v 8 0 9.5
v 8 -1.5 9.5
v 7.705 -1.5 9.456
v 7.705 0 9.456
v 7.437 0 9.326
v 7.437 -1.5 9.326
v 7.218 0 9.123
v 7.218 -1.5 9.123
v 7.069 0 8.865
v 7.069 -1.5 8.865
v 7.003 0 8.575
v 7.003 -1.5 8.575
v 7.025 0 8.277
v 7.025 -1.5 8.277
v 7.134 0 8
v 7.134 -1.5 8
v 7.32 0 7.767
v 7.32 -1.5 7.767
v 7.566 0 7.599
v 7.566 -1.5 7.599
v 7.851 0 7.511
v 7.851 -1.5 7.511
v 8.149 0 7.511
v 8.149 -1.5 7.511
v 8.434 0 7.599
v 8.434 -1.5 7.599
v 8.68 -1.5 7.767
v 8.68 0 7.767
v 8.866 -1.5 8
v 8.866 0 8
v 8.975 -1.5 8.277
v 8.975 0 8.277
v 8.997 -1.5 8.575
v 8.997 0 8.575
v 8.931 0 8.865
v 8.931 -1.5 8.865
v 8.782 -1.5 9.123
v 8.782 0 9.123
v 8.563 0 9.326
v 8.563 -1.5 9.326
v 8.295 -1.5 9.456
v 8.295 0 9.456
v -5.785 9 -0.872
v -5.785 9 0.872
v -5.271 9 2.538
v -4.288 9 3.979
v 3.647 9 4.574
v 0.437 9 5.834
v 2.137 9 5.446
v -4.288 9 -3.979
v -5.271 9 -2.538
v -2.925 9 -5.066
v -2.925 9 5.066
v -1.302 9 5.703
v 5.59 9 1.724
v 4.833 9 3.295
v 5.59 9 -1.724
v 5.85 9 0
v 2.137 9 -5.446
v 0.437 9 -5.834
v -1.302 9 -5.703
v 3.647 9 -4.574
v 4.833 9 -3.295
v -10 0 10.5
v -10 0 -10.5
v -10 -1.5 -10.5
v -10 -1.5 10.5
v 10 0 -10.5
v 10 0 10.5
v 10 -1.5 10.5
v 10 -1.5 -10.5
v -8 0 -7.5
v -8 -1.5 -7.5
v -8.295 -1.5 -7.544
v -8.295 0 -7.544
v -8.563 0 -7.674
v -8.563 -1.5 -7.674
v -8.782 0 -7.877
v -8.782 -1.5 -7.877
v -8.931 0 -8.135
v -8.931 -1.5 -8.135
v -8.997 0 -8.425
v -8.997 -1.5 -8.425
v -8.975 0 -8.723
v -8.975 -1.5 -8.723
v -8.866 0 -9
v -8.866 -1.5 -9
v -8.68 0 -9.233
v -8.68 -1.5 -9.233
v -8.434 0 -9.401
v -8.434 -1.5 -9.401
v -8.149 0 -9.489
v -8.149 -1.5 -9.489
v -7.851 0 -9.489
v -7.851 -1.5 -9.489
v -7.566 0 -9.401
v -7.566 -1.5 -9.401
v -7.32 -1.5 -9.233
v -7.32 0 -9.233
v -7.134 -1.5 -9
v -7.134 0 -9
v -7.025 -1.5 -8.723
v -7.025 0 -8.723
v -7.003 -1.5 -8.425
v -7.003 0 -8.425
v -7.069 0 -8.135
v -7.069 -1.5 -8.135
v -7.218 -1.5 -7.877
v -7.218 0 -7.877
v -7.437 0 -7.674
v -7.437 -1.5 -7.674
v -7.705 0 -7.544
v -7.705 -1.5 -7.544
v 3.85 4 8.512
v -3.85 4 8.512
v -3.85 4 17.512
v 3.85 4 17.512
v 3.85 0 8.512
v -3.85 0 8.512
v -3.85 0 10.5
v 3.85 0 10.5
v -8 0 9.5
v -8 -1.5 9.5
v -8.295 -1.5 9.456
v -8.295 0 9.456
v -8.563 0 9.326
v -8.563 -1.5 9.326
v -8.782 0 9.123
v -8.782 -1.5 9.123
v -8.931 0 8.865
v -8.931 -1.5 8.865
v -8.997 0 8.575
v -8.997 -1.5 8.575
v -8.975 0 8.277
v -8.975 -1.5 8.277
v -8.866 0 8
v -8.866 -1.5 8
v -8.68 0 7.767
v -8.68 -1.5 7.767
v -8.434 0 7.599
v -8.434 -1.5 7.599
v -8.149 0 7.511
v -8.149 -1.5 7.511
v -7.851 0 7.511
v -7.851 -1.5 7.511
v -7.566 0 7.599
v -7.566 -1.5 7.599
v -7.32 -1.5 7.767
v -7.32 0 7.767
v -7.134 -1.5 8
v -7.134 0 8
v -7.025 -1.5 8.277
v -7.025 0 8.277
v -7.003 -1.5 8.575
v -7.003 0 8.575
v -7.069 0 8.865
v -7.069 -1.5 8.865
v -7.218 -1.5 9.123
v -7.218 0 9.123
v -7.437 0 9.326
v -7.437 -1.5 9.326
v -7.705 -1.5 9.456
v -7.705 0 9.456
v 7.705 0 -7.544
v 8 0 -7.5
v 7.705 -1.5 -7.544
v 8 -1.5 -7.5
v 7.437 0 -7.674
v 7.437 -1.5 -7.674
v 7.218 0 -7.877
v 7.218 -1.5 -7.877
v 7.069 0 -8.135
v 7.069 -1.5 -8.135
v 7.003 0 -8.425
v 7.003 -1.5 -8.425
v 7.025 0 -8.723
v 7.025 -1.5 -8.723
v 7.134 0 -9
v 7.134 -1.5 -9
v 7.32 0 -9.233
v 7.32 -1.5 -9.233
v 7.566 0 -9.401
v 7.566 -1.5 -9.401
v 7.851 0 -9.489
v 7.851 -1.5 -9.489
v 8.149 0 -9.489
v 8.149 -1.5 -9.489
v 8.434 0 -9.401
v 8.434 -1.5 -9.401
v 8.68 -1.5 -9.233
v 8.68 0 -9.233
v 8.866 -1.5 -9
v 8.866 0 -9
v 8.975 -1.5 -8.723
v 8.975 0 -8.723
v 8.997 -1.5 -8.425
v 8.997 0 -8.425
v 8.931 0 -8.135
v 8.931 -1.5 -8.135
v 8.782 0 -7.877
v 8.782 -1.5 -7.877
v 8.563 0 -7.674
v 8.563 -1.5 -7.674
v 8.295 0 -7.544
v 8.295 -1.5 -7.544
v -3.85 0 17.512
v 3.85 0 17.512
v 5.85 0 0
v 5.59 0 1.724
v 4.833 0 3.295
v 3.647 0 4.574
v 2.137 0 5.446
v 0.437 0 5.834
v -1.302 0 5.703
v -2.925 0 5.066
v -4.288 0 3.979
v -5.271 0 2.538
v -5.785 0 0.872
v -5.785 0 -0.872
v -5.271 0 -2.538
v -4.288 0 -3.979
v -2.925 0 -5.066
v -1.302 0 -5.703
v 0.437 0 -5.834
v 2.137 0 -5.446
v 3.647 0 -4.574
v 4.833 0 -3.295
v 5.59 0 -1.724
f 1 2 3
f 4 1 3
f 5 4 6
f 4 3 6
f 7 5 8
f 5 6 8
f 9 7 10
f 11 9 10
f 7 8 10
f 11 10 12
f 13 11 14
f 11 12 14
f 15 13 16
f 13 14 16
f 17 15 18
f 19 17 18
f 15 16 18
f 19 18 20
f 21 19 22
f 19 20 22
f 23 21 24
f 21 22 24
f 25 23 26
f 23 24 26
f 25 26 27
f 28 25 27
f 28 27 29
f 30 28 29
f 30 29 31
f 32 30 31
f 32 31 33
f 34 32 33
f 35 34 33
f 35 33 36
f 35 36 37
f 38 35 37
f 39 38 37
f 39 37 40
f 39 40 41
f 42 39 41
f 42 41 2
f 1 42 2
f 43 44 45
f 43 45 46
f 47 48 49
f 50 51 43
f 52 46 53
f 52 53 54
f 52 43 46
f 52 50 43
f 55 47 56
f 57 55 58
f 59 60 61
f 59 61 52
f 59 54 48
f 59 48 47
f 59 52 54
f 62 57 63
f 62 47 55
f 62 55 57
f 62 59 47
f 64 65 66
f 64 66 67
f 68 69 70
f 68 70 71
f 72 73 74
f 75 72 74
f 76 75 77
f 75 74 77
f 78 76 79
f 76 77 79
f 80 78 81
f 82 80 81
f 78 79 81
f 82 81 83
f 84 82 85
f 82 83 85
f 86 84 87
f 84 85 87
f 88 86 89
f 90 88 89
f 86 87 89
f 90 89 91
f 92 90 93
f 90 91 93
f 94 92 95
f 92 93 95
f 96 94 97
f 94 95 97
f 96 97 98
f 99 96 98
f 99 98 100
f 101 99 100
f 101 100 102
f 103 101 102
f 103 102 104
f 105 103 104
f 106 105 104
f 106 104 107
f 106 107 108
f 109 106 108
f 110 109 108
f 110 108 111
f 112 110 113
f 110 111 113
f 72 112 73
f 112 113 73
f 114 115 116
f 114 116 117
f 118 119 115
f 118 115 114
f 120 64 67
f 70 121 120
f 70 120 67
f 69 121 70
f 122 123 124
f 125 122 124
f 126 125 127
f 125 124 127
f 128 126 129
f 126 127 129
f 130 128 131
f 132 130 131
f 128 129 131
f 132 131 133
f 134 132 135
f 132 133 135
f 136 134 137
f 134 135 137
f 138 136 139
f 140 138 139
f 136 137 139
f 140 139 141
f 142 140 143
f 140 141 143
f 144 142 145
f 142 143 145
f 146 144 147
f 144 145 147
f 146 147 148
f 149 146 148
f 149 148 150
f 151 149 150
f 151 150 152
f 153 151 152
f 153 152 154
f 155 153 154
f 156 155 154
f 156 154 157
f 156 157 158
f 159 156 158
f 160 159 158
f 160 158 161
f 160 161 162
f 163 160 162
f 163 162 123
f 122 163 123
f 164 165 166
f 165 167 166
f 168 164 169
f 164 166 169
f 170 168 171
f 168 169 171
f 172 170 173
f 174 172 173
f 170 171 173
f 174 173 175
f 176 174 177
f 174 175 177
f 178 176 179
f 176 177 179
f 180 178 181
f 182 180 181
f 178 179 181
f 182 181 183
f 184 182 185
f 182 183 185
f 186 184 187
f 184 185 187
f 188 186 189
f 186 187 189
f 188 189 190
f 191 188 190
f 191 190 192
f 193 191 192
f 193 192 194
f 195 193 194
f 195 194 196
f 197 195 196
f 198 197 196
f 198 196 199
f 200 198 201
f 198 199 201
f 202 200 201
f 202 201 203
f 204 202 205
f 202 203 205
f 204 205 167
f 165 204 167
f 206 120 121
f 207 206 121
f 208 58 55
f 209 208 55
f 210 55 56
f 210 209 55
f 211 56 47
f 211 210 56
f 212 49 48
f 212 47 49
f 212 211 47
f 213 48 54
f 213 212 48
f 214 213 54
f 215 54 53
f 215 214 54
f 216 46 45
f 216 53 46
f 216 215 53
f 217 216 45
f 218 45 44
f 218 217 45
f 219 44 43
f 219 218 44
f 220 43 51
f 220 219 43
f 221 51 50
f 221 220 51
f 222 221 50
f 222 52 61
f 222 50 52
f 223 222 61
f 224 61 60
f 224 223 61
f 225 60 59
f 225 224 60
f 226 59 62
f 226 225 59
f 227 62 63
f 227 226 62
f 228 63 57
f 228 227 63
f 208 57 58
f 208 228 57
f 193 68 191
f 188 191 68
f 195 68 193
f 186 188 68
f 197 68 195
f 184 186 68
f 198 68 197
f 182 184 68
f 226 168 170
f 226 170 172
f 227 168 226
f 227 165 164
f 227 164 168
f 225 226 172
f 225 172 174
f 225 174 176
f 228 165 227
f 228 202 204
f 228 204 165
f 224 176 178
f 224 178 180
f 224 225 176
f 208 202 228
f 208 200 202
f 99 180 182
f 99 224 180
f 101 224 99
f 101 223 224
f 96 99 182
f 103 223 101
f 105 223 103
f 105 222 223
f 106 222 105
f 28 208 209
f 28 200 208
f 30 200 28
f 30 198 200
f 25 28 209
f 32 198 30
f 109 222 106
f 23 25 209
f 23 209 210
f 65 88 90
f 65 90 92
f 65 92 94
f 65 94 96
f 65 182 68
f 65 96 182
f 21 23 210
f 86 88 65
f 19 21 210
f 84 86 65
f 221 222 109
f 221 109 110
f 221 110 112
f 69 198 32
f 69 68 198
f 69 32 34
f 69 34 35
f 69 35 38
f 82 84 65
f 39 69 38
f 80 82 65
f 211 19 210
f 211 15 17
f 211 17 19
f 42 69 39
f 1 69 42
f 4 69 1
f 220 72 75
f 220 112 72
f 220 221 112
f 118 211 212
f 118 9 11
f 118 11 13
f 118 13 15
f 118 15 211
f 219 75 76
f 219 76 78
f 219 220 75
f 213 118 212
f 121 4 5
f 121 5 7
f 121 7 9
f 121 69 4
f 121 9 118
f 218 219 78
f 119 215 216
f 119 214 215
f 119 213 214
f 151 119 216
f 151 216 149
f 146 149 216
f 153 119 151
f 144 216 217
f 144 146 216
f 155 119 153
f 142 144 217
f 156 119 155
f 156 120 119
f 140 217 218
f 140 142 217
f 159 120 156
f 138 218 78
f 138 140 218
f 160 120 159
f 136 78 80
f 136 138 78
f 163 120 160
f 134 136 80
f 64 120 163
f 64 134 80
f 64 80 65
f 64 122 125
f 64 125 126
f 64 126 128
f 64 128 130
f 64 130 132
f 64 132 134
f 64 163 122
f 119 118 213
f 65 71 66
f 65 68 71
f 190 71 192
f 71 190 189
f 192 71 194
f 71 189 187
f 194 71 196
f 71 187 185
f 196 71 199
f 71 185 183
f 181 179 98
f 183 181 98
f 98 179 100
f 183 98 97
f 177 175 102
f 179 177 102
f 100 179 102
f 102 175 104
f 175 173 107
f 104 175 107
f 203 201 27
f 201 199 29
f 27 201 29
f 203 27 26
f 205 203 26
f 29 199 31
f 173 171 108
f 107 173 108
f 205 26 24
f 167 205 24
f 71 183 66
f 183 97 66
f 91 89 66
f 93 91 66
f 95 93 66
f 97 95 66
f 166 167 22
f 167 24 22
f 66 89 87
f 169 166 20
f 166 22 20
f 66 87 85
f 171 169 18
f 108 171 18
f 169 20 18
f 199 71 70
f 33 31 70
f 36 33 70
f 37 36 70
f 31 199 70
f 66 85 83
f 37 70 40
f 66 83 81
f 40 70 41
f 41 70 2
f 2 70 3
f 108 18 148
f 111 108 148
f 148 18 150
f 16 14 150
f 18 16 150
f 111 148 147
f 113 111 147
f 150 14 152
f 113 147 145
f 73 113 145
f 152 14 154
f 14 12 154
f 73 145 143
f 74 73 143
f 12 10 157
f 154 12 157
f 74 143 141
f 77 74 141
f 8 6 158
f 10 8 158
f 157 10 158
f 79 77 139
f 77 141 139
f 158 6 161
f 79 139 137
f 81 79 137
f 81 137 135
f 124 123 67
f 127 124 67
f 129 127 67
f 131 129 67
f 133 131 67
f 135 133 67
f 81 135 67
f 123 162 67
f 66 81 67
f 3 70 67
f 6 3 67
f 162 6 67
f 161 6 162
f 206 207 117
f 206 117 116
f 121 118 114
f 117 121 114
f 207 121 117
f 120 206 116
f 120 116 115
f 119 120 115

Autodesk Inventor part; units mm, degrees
ref_plane "YZ Plane" through (0, 0, 0) normal (1, 0, 0) x (0, 1, 0)
ref_plane "XZ Plane" through (0, 0, 0) normal (0, 1, 0) x (-1, 0, 0)
ref_plane "XY Plane" through (0, 0, 0) normal (0, 0, 1) x (1, 0, 0)
sketch "Sketch1" plane through (0, 0, 0) normal (0, 1, 0) x (-1, 0, 0)
  line L0 (10, 10.5) -> (-10, 10.5)
  line L1 (-10, 10.5) -> (-10, -10.5)
  line L2 (-10, -10.5) -> (10, -10.5)
  line L3 (10, -10.5) -> (10, 10.5)
  line L4 (10, 10.5) -> (-10, -10.5) construction
  line L5 (-10, 10.5) -> (10, -10.5) construction
  line L6 (8, 8.5) -> (-8, 8.5)
  line L7 (-8, 8.5) -> (-8, -8.5)
  line L8 (-8, -8.5) -> (8, -8.5)
  line L9 (8, -8.5) -> (8, 8.5)
  point P0 (0, 0)
  dimension "d0" = 20
  dimension "d1" = 21
  dimension "d2" = 2
extrude "Extrusion1" add sketch "Sketch1" against normal blind 1.5 contours L3 L2 L1 L0 | L9 L8 L7 L6
hole "Hole1" at (-8, 0, 8.5) at (-8, 0, -8.5) at (8, 0, -8.5) at (8, 0, 8.5) direction (0, -1, 0) diameter 2 end through all
sketch "Sketch2" plane through (0, 0, 0) normal (0, 1, 0) x (1, 0, 0)
  line L0 (-3.85, -8.5124) -> (3.85, -8.5124)
  line L1 (3.85, -8.5124) -> (3.85, -17.5124)
  line L2 (3.85, -17.5124) -> (-3.85, -17.5124)
  line L3 (-3.85, -17.5124) -> (-3.85, -8.5124)
  line L4 (-3.85, -8.5124) -> (3.85, -17.5124) construction
  line L5 (3.85, -8.5124) -> (-3.85, -17.5124) construction
  line L6 (-10, -10.5) -> (10, -10.5) projected
  line L7 (-10, 10.5) -> (-10, -10.5) projected
  point P0 (0, 0)
  point P1 (0, -13.0124)
  point P2 (0, -8.5124)
  point P3 (0, -8.5124)
  dimension "d12" = 7.7
  dimension "d13" = 9
  dimension "d14" = 1.9876
  dimension "d15" = 10
extrude "Extrusion2" add sketch "Sketch2" along normal blind 4
sketch "Sketch3" plane through (0, 0, 0) normal (0, 1, 0) x (1, 0, 0)
  circle A0 centre (0, 0) radius 5.85
  dimension "d18" = 11.7
extrude "Extrusion3" add sketch "Sketch3" along normal blind 9
properties part number "buzzer_footprint"
